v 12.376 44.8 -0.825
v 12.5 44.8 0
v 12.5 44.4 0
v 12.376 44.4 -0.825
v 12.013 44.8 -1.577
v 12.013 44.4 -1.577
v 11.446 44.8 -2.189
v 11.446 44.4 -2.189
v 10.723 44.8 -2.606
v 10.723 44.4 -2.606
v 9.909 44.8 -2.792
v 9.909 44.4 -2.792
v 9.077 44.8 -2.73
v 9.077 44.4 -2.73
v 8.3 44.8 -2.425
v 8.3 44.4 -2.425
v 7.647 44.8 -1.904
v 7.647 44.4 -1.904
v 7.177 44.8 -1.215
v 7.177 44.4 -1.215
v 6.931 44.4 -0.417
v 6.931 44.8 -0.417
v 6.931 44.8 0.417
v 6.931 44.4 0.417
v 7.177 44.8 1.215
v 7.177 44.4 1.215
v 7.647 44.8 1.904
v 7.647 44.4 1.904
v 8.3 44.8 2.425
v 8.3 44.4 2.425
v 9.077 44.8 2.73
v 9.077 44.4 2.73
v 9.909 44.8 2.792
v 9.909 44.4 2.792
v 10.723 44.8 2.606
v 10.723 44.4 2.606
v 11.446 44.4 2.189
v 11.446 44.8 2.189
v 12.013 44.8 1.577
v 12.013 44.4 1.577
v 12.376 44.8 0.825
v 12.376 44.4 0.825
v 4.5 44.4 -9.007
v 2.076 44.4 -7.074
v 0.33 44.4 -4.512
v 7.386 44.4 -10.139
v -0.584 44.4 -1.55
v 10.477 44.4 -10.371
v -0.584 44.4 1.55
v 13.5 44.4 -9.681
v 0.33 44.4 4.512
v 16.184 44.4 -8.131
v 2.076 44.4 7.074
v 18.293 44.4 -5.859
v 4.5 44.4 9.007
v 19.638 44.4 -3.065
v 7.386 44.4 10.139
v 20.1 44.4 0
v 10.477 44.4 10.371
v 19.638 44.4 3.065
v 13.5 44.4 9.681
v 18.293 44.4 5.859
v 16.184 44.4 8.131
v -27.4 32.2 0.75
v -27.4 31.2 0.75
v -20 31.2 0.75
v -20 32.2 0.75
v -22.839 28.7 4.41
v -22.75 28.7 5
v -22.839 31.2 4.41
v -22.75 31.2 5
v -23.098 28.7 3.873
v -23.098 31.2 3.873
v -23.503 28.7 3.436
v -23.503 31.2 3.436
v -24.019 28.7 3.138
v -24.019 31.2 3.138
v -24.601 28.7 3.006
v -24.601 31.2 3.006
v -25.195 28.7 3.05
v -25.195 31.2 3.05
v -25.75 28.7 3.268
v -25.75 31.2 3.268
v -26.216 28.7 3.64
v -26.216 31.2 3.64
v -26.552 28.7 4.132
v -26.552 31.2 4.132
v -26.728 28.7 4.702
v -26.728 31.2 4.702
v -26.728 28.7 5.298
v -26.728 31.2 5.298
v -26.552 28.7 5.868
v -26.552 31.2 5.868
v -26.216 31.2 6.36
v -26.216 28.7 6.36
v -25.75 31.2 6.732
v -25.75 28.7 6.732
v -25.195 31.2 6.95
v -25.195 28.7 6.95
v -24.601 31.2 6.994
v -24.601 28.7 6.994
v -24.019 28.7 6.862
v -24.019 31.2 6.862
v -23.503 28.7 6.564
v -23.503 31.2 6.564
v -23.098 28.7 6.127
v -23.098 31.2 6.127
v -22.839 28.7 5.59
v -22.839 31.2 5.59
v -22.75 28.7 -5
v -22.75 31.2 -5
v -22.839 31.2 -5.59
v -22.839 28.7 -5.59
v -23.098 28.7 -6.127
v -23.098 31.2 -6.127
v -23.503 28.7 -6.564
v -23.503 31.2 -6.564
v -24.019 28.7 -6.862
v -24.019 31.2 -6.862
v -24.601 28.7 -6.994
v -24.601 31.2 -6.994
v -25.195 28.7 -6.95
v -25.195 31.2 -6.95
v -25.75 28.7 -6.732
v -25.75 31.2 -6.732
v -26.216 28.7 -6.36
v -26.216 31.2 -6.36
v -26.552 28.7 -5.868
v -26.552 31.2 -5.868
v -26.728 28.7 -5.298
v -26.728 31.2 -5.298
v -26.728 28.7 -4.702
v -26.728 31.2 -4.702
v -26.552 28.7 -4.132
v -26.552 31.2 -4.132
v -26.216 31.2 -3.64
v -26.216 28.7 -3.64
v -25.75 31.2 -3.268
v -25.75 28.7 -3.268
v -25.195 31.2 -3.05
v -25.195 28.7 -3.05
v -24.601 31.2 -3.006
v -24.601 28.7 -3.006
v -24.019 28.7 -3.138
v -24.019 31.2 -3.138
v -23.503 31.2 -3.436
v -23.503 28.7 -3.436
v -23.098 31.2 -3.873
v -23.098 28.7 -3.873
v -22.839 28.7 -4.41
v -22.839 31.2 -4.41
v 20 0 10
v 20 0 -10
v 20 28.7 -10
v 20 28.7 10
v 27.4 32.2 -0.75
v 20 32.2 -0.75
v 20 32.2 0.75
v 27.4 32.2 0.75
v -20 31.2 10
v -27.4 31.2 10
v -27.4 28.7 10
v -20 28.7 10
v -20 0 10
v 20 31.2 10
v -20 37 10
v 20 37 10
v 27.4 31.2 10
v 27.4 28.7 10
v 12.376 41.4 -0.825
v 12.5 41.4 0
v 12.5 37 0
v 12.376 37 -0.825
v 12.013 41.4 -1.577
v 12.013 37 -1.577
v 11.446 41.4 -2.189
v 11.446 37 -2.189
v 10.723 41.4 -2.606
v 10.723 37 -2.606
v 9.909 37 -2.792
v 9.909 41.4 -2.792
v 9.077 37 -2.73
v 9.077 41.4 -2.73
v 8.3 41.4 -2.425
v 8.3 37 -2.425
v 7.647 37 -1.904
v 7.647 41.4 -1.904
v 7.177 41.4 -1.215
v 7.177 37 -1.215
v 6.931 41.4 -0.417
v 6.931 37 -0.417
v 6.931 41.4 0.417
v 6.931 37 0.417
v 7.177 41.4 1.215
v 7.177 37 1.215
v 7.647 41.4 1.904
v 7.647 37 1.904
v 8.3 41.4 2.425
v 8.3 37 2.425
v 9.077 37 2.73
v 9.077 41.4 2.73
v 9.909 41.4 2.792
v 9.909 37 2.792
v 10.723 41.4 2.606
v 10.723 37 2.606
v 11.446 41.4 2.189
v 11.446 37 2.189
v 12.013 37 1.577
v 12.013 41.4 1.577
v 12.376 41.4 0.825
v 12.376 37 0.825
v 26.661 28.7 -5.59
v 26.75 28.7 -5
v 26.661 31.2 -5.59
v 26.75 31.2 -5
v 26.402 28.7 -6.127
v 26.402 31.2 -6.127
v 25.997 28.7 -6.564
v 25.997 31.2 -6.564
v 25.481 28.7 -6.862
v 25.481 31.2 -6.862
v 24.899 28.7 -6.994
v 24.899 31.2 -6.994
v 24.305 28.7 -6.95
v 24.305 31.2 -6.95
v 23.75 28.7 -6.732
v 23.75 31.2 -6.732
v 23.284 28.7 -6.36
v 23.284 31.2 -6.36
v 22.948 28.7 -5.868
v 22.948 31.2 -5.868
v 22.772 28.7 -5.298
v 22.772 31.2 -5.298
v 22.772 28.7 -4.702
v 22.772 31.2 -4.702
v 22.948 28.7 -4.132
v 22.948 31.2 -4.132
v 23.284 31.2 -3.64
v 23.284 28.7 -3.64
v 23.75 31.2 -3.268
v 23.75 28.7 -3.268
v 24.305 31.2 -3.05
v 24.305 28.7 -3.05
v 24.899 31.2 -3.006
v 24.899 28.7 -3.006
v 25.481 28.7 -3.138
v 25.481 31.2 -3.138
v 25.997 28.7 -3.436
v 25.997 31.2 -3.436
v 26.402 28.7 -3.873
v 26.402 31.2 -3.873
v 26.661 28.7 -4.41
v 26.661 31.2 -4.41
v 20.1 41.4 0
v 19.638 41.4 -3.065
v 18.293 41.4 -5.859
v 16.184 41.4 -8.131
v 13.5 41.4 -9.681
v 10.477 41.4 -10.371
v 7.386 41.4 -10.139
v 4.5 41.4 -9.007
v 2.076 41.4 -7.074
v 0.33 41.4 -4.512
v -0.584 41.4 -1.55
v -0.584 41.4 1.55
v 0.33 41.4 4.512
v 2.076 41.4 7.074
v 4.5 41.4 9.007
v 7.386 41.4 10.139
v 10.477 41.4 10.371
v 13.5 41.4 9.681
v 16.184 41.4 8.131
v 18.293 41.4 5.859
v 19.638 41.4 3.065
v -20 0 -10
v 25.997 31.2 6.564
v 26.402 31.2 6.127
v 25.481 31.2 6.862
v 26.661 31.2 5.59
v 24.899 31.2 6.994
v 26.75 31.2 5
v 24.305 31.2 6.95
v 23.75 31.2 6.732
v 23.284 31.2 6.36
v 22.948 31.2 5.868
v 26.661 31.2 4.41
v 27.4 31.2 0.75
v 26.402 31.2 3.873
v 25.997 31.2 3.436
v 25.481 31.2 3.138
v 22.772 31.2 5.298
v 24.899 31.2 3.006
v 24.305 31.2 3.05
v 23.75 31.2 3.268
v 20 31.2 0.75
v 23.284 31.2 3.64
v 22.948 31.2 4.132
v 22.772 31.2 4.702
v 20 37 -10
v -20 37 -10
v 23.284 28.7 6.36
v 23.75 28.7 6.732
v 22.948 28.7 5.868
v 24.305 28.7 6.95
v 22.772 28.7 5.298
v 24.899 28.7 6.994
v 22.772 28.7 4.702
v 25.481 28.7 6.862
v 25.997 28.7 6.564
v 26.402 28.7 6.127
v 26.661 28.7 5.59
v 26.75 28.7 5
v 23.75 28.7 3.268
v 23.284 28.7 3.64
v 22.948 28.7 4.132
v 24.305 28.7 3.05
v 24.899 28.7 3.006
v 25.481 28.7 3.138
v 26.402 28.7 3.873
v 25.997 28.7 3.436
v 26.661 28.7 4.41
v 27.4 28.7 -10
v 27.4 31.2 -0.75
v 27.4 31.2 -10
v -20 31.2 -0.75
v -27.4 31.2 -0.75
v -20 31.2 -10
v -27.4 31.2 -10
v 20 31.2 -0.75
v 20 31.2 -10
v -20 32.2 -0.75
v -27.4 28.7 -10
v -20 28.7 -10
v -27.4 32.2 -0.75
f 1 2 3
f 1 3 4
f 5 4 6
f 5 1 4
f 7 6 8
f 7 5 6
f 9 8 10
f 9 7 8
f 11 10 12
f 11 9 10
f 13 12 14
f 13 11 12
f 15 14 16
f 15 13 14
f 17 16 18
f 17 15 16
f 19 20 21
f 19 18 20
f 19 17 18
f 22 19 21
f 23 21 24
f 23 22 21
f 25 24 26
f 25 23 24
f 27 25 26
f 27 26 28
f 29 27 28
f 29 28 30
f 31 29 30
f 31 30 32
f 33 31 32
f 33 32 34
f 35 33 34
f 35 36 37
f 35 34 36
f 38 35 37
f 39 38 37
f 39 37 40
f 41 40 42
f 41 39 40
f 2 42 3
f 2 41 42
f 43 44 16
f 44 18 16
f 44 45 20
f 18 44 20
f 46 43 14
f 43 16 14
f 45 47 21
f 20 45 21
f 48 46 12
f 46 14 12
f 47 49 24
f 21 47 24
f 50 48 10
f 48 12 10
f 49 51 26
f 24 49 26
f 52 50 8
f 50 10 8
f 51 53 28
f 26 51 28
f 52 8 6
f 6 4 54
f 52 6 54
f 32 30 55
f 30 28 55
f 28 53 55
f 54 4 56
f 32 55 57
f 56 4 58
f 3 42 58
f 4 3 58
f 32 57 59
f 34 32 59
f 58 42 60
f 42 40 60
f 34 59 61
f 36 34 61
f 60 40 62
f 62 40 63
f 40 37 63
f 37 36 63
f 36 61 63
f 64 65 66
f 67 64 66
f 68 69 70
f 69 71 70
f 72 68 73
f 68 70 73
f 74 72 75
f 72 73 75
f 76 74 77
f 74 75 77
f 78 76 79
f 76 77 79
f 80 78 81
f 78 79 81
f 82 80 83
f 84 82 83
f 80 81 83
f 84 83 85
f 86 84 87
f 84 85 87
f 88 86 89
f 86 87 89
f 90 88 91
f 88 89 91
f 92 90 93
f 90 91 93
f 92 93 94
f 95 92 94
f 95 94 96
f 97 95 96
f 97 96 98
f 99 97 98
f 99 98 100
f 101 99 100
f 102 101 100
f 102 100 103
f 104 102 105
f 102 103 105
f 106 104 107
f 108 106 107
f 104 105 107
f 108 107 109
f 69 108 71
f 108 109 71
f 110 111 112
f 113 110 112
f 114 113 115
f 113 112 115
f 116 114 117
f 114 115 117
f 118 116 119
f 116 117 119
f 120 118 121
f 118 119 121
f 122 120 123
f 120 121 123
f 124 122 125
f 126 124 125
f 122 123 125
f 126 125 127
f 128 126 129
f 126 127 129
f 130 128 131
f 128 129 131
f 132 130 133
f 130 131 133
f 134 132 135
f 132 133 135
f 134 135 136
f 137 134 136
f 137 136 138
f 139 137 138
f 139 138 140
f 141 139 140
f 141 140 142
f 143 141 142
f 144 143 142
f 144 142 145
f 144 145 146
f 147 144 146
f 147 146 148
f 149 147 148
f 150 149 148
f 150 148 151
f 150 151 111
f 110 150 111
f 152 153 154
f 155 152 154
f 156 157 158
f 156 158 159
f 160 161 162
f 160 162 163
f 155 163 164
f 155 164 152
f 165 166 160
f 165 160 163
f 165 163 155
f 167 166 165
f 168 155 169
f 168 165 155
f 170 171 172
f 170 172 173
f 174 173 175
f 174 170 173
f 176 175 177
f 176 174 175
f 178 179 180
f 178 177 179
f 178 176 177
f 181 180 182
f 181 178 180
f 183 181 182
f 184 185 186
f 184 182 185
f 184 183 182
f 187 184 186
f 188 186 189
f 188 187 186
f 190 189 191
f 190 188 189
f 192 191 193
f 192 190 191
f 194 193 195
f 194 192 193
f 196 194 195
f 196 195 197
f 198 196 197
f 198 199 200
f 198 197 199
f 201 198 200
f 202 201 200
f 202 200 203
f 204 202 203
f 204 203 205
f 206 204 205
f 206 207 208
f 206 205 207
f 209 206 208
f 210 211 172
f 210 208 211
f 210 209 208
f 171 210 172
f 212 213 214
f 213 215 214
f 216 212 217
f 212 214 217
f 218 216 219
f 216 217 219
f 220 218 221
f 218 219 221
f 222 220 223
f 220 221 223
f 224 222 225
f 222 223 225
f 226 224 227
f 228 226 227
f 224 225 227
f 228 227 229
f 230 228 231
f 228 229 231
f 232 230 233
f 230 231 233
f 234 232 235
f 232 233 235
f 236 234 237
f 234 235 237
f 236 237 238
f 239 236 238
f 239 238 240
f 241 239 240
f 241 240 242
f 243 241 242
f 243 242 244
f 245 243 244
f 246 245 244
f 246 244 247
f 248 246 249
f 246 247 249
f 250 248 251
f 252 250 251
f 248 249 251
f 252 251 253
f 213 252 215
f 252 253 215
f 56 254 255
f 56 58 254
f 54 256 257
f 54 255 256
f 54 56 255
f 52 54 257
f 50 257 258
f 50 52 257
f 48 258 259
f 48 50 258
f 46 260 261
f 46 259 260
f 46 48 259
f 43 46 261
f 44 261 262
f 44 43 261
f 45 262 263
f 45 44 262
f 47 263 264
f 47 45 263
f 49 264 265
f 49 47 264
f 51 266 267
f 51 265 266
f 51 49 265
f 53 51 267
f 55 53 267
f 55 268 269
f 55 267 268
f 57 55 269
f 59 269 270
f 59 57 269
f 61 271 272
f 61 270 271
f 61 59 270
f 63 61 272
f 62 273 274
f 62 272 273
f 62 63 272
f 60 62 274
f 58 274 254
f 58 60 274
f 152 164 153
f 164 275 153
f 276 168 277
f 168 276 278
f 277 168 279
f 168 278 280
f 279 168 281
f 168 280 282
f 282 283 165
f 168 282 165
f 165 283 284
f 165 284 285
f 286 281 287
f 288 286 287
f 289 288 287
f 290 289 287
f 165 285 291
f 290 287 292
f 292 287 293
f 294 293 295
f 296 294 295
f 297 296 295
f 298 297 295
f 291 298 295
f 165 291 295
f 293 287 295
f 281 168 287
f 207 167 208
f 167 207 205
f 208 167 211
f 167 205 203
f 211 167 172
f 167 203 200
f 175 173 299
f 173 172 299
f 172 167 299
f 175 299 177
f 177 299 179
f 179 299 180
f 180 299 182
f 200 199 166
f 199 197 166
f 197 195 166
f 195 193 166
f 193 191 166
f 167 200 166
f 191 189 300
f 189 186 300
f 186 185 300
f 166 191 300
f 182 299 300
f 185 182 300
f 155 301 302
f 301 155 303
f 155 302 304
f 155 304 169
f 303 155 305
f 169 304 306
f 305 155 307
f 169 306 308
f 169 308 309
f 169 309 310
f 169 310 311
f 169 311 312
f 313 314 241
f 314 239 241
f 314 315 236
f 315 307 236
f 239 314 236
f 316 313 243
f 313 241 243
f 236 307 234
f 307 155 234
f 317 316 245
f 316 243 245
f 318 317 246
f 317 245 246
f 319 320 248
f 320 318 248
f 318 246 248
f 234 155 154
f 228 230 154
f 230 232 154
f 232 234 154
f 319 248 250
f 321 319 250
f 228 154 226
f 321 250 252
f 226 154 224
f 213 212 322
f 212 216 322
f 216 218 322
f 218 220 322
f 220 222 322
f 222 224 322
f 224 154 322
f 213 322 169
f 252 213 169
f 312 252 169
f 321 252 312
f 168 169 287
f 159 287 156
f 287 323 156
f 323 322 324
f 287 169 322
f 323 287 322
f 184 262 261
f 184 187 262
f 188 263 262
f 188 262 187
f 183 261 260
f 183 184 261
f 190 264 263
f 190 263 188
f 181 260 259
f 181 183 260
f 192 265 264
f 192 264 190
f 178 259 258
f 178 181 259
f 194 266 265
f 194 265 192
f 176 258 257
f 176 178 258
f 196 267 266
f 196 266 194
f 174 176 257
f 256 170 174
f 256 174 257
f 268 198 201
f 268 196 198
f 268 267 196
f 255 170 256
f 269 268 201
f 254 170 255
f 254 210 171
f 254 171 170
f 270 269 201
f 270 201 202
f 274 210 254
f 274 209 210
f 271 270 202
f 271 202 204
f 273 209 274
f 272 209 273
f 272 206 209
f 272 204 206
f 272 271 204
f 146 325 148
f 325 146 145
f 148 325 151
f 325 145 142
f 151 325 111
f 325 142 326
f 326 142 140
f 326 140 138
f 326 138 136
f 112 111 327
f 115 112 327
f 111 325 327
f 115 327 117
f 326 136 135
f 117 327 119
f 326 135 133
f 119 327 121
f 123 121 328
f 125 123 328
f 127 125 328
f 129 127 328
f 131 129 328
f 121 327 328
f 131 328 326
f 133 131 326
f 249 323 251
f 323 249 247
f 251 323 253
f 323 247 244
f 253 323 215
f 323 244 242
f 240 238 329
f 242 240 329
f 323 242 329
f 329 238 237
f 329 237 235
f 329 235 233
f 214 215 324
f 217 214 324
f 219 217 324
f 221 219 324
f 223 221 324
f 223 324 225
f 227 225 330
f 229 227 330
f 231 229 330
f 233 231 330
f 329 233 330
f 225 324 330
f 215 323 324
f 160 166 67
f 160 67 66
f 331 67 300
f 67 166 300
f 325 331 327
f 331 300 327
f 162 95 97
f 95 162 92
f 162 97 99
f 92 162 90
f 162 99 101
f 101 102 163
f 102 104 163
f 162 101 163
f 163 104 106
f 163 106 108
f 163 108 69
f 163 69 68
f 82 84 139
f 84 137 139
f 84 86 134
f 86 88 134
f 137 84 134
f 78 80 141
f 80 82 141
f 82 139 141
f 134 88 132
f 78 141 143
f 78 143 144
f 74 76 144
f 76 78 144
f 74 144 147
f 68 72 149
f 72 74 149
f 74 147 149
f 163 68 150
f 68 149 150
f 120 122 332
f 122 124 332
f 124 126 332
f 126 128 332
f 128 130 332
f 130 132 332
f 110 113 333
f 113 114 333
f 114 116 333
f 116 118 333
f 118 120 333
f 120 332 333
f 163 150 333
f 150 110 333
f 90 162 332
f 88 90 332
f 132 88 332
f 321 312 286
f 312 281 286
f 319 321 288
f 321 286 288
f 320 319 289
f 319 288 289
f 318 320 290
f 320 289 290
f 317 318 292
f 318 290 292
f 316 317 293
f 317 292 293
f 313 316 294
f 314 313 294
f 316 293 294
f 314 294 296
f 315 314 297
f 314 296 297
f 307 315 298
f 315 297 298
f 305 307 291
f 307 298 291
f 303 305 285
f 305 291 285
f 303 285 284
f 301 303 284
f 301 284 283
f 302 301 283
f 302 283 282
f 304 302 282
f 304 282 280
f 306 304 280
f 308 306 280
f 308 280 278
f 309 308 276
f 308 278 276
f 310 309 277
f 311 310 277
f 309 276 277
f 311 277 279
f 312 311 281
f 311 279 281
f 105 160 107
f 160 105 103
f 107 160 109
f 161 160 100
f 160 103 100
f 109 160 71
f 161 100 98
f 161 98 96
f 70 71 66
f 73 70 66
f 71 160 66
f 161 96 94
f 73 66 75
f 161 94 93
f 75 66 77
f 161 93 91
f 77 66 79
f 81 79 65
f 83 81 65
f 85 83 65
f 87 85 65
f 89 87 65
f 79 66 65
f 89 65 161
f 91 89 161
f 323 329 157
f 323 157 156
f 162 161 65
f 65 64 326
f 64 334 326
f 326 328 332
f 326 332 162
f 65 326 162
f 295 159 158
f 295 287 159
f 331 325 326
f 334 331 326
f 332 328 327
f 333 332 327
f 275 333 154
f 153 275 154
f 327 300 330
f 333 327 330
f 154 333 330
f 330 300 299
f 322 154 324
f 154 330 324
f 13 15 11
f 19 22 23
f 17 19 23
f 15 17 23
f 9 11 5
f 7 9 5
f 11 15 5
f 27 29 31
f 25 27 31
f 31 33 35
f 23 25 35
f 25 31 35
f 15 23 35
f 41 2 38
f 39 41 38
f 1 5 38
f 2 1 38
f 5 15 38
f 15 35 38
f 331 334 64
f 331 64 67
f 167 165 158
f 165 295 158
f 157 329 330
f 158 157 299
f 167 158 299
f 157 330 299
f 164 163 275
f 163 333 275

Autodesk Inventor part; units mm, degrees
ref_plane "YZ Plane" through (0, 0, 0) normal (1, 0, 0) x (0, 1, 0)
ref_plane "XZ Plane" through (0, 0, 0) normal (0, 1, 0) x (-1, 0, 0)
ref_plane "XY Plane" through (0, 0, 0) normal (0, 0, 1) x (1, 0, 0)
sketch "Sketch1" plane through (0, 0, 0) normal (0, 0, 1) x (1, 0, 0)
  line L0 (-20, 0) -> (20, 0)
  line L1 (20, 0) -> (20, 28.7)
  line L2 (20, 28.7) -> (27.4, 28.7)
  line L3 (27.4, 28.7) -> (27.4, 31.2)
  line L4 (27.4, 31.2) -> (20, 31.2)
  line L5 (20, 31.2) -> (20, 37)
  line L6 (20, 37) -> (-20, 37)
  line L7 (-20, 37) -> (-20, 31.2)
  line L8 (-20, 31.2) -> (-27.4, 31.2)
  line L9 (-27.4, 31.2) -> (-27.4, 28.7)
  line L10 (-27.4, 28.7) -> (-20, 28.7)
  line L11 (-20, 28.7) -> (-20, 0)
  point P0 (0, 0)
  point P1 (0, 0)
  dimension "d0" = 40
  dimension "d1" = 28.7
  dimension "d2" = 7.4
  dimension "d3" = 2.5
  dimension "d4" = 5.8
  dimension "d5" = 7.4
extrude "Extrusion1" add sketch "Sketch1" along normal mid plane 20
sketch "Sketch4" plane through (0, 0, 0) normal (0, 0, 1) x (1, 0, 0)
  line L0 (20, 37) -> (-20, 37) projected
  line L1 (12.5, 37) -> (12.5, 41.4)
  line L2 (12.5, 41.4) -> (20.1, 41.4)
  line L3 (20.1, 41.4) -> (20.1, 44.4)
  line L4 (20.1, 44.4) -> (12.5, 44.4)
  line L5 (12.5, 44.4) -> (12.5, 44.8)
  line L6 (12.5, 44.8) -> (9.7, 44.8)
  line L7 (12.5, 37) -> (9.7, 37)
  line L8 (9.7, 44.8) -> (9.7, 37)
  point P0 (0, 0)
  point P1 (0, 37)
  dimension "d10" = 9.7
  dimension "d11" = 0.4
  dimension "d12" = 10.4
  dimension "d13" = 2.8
  dimension "d14" = 4.4
  dimension "d15" = 3
revolve "Revolution1" add sketch "Sketch4" angle 360 about axis through (9.7, 44.8, 0) along (0, -1, 0)
sketch "Sketch5" plane through (-27.4, 31.2, 10) normal (0, 1, 0) x (1, 0, 0)
  circle A0 centre (2.65, 15) radius 2
  line L0 (0, 20) -> (0, 0) projected
  line L1 (7.4, 0) -> (0, 0) projected
  line L2 (7.4, 20) -> (7.4, 0) projected
  line L3 (0, 20) -> (7.4, 20) projected
  line L4 (47.4, 20) -> (47.4, 0) projected
  line L5 (54.8, 0) -> (47.4, 0) projected
  line L6 (54.8, 20) -> (54.8, 0) projected
  line L7 (47.4, 20) -> (54.8, 20) projected
  line L8 (7.4, 20) -> (47.4, 20) projected
  line L9 (27.4, 20) -> (27.4, 0) construction
  line L10 (7.4, 0) -> (47.4, 0) projected
  line L11 (0, 20) -> (0, 0) projected
  line L12 (0, 10) -> (54.8, 10) construction
  line L13 (54.8, 20) -> (54.8, 0) projected
  circle A1 centre (2.65, 5) radius 2
  circle A2 centre (52.15, 15) radius 2
  circle A3 centre (52.15, 5) radius 2
  line L14 (7.4, 0) -> (7.4, 20) projected
  line L15 (7.4, 10.75) -> (0, 10.75)
  line L16 (0, 10.75) -> (0, 9.25)
  line L17 (0, 9.25) -> (7.4, 9.25)
  line L18 (7.4, 9.25) -> (7.4, 10.75)
  line L19 (47.4, 10.75) -> (54.8, 10.75)
  line L20 (54.8, 10.75) -> (54.8, 9.25)
  line L21 (54.8, 9.25) -> (47.4, 9.25)
  line L22 (47.4, 9.25) -> (47.4, 10.75)
  point P0 (27.4, 10)
  dimension "d17" = 4
  dimension "d18" = 10
  dimension "d19" = 49.5
  dimension "d22" = 7.4
  dimension "d23" = 1.5
extrude "Extrusion2" cut sketch "Sketch5" against normal up to next contours A0 | A1 | A2 | A3
extrude "Extrusion3" add sketch "Sketch5" along normal blind 1 contours L15 L2 L17 L0 | L19 L6 L21 L4
sketch "Sketch6" plane through (-20, 0, 10) normal (0, -1, 0) x (1, 0, 0)
  line L0 (0, 0) -> (0, -20) construction
  line L1 (0, -10) -> (40, -10) construction
  line L2 (40, -20) -> (40, 0) construction
  line L3 (40, 0) -> (0, 0) construction
  line L4 (20, 0) -> (20, -20) construction
  line L5 (0, -20) -> (40, -20) construction
  line L6 (40, 0) -> (0, 0) construction
  line L7 (0, 0) -> (0, -20) construction
  line L8 (0, -20) -> (40, -20) construction
  line L9 (40, -20) -> (40, 0) construction
  circle A0 centre (29.7, -10) radius 2.8 projected
  circle A1 centre (-4.75, -5) radius 2 projected
  circle A2 centre (-4.75, -15) radius 2 projected
  circle A3 centre (44.75, -15) radius 2 projected
  circle A4 centre (44.75, -5) radius 2 projected
  line L10 (-7.4, -10.75) -> (0, -10.75) projected
  line L11 (0, -9.25) -> (-7.4, -9.25) projected
  line L12 (40, -10.75) -> (47.4, -10.75) projected
  line L13 (47.4, -9.25) -> (40, -9.25) projected
  line L14 (40, -20) -> (40, 0) projected
  line L15 (47.4, -20) -> (47.4, 0) projected
  line L16 (40, 0) -> (47.4, 0) projected
  circle A5 centre (44.75, -15) radius 2 projected
  circle A6 centre (44.75, -5) radius 2 projected
  line L17 (47.4, -20) -> (47.4, 0) projected
  line L18 (40, 0) -> (47.4, 0) projected
  line L19 (40, -20) -> (40, 0) projected
  line L20 (47.4, -20) -> (40, -20) projected
  circle A7 centre (-4.75, -15) radius 2 projected
  circle A8 centre (-4.75, -5) radius 2 projected
  line L21 (0, -20) -> (0, 0) projected
  line L22 (-7.4, 0) -> (0, 0) projected
  line L23 (-7.4, -20) -> (-7.4, 0) projected
  line L24 (0, -20) -> (-7.4, -20) projected
  point P0 (20, -10)
properties part number "feedback_servo"
